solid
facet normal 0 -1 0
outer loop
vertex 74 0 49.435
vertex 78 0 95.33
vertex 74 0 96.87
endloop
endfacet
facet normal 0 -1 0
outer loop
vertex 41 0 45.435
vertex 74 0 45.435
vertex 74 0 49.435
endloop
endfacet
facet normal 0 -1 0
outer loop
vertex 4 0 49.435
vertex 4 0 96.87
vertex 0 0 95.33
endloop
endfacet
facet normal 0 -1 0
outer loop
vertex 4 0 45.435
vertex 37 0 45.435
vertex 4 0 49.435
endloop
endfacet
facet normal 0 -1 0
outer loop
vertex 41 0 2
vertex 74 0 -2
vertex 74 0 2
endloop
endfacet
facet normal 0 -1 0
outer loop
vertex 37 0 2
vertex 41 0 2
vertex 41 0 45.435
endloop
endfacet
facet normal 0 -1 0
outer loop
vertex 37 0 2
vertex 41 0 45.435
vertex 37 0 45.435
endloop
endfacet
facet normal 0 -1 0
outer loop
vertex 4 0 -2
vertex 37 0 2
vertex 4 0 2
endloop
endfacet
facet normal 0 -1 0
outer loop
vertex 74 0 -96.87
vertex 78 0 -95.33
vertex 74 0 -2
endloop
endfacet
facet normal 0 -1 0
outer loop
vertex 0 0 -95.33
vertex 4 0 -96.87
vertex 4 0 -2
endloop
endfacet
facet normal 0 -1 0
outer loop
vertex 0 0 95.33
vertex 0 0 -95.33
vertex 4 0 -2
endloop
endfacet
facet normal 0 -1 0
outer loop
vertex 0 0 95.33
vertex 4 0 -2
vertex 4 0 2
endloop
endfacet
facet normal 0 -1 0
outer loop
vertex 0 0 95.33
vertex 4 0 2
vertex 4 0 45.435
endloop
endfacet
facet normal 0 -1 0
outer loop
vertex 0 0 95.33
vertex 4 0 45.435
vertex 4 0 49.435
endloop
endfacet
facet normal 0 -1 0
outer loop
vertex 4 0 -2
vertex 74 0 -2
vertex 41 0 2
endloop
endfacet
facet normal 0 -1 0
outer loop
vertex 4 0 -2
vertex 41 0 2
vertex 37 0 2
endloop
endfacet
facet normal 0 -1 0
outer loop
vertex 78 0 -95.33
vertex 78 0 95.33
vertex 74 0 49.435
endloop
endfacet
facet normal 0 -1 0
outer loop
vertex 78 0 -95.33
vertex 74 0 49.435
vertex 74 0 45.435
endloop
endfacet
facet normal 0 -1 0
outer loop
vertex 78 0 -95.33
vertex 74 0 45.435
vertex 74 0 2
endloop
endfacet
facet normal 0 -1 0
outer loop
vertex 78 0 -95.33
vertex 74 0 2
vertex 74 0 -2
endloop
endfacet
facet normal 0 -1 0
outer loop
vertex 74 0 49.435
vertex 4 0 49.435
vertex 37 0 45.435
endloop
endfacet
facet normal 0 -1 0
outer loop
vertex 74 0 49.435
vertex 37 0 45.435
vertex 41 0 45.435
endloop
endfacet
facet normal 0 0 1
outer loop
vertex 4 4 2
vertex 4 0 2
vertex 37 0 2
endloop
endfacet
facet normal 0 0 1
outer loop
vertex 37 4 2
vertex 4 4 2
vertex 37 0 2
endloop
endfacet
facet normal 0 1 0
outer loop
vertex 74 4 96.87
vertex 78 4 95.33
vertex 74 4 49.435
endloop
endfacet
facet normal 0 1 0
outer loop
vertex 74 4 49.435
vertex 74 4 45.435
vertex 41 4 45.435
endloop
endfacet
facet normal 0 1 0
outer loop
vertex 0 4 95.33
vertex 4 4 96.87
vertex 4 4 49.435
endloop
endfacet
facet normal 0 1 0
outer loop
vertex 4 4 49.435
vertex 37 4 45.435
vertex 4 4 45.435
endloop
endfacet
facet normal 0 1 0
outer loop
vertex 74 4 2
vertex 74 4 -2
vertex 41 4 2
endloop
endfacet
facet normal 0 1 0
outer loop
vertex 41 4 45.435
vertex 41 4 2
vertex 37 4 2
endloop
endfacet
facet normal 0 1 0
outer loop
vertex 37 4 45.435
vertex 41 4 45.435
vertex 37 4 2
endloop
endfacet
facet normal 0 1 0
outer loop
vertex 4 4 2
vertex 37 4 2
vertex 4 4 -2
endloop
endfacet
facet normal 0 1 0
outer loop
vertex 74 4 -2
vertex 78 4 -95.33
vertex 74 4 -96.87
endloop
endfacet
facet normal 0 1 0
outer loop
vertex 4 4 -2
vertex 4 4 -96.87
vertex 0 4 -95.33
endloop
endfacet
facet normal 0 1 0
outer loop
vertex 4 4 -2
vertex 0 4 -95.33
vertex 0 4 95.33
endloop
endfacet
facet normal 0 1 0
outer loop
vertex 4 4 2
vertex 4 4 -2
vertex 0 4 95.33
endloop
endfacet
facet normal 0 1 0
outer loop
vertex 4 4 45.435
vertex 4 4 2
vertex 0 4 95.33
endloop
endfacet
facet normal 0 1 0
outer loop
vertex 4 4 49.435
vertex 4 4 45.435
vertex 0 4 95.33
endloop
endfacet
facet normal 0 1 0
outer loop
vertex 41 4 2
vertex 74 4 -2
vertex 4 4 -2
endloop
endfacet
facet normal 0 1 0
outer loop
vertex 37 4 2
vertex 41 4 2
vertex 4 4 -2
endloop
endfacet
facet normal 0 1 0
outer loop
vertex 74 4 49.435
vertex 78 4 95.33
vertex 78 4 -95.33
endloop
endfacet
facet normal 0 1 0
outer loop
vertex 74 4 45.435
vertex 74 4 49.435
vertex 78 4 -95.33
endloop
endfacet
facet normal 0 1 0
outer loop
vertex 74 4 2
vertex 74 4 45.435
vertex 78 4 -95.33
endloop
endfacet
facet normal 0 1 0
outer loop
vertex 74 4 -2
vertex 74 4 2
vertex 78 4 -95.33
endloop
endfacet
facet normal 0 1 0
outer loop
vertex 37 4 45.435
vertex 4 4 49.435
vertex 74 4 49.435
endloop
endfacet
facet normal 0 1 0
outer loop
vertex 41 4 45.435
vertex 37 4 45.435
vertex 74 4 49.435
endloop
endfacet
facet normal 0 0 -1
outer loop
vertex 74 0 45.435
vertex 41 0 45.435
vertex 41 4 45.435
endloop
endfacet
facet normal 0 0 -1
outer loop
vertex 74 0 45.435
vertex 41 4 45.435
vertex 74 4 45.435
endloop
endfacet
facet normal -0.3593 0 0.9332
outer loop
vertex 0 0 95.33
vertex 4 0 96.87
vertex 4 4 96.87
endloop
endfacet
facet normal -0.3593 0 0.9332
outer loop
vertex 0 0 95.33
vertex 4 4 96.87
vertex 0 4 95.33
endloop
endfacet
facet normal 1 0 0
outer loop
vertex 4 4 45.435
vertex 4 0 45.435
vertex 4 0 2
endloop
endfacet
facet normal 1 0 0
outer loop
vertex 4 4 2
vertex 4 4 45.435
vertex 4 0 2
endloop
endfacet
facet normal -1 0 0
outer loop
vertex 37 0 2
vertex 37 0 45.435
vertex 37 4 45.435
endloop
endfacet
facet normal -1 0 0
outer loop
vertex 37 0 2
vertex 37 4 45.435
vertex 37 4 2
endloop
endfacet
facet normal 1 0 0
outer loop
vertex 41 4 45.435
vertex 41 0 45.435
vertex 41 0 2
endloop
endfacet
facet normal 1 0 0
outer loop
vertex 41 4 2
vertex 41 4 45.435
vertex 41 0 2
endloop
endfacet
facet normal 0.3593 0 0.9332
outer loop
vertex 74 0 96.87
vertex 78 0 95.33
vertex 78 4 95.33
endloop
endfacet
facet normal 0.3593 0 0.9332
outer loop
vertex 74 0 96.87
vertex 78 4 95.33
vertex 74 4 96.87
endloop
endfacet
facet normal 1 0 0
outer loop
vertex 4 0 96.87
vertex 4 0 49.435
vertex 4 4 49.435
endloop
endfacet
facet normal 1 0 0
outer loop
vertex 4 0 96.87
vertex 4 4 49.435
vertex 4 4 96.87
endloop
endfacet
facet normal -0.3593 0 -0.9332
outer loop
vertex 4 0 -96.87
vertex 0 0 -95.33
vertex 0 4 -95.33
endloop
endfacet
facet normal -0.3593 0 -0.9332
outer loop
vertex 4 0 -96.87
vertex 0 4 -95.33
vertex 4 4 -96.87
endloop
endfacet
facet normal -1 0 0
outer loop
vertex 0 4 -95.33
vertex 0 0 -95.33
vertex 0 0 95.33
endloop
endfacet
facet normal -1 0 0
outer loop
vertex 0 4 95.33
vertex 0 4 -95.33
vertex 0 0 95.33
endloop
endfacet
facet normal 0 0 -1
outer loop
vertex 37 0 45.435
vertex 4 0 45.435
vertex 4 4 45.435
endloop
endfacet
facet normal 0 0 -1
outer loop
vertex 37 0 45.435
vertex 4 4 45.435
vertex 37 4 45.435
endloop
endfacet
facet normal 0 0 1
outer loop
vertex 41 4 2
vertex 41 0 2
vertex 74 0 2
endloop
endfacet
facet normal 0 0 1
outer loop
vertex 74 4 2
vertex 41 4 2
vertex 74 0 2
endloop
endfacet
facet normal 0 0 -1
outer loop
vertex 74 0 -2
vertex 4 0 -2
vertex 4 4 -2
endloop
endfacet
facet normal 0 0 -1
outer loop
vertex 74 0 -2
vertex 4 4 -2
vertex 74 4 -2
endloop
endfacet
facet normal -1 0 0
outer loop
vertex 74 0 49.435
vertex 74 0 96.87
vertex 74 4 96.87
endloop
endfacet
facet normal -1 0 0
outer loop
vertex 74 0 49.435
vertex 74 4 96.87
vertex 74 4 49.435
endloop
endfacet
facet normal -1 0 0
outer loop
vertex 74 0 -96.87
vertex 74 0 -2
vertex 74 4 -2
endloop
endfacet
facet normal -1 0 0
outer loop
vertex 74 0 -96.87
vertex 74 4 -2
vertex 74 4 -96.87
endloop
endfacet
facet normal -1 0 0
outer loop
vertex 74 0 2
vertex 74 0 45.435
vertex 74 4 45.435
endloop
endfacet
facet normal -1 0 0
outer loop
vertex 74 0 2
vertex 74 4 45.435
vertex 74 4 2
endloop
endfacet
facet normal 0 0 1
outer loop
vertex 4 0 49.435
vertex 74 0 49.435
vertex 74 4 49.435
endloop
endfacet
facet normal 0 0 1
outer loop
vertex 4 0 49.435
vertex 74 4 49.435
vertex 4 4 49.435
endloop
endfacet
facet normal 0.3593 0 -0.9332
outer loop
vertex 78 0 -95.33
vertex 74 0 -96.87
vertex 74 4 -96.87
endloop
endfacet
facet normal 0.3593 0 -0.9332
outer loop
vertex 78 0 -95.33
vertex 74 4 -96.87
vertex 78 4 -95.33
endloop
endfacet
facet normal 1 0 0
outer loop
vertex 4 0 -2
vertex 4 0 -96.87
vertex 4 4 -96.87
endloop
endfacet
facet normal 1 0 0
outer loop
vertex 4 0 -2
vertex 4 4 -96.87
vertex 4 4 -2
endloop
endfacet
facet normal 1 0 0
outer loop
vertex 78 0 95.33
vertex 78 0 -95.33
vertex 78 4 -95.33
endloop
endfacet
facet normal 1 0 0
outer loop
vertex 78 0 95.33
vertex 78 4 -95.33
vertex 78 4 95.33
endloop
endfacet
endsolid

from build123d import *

# Parameters (mm, degrees)
SKETCH_1_W      = 33
SKETCH_1_H      = 43.435
EXTRUDE_1_DEPTH = 4


with BuildPart() as part:
    # 草图1 → 凸台-拉伸1 (new body)
    with BuildSketch(Plane(origin=(0, 0, 0), x_dir=(1, 0, 0), z_dir=(0, 1, 0))):
        Polygon((0, 0), (0, 95.33), (4, 96.87), (4, 2), (74, 2), (74, 96.87), (78, 95.33), (78, -95.33), (74, -96.87), (74, -49.435), (4, -49.435), (4, -96.87), (0, -95.33), align=None)
        with Locations((20.5, -23.7175)):
            Rectangle(SKETCH_1_W, SKETCH_1_H, mode=Mode.SUBTRACT)
        with Locations((57.5, -23.7175)):
            Rectangle(SKETCH_1_W, SKETCH_1_H, mode=Mode.SUBTRACT)
    extrude(amount=EXTRUDE_1_DEPTH)


solid = part.part
